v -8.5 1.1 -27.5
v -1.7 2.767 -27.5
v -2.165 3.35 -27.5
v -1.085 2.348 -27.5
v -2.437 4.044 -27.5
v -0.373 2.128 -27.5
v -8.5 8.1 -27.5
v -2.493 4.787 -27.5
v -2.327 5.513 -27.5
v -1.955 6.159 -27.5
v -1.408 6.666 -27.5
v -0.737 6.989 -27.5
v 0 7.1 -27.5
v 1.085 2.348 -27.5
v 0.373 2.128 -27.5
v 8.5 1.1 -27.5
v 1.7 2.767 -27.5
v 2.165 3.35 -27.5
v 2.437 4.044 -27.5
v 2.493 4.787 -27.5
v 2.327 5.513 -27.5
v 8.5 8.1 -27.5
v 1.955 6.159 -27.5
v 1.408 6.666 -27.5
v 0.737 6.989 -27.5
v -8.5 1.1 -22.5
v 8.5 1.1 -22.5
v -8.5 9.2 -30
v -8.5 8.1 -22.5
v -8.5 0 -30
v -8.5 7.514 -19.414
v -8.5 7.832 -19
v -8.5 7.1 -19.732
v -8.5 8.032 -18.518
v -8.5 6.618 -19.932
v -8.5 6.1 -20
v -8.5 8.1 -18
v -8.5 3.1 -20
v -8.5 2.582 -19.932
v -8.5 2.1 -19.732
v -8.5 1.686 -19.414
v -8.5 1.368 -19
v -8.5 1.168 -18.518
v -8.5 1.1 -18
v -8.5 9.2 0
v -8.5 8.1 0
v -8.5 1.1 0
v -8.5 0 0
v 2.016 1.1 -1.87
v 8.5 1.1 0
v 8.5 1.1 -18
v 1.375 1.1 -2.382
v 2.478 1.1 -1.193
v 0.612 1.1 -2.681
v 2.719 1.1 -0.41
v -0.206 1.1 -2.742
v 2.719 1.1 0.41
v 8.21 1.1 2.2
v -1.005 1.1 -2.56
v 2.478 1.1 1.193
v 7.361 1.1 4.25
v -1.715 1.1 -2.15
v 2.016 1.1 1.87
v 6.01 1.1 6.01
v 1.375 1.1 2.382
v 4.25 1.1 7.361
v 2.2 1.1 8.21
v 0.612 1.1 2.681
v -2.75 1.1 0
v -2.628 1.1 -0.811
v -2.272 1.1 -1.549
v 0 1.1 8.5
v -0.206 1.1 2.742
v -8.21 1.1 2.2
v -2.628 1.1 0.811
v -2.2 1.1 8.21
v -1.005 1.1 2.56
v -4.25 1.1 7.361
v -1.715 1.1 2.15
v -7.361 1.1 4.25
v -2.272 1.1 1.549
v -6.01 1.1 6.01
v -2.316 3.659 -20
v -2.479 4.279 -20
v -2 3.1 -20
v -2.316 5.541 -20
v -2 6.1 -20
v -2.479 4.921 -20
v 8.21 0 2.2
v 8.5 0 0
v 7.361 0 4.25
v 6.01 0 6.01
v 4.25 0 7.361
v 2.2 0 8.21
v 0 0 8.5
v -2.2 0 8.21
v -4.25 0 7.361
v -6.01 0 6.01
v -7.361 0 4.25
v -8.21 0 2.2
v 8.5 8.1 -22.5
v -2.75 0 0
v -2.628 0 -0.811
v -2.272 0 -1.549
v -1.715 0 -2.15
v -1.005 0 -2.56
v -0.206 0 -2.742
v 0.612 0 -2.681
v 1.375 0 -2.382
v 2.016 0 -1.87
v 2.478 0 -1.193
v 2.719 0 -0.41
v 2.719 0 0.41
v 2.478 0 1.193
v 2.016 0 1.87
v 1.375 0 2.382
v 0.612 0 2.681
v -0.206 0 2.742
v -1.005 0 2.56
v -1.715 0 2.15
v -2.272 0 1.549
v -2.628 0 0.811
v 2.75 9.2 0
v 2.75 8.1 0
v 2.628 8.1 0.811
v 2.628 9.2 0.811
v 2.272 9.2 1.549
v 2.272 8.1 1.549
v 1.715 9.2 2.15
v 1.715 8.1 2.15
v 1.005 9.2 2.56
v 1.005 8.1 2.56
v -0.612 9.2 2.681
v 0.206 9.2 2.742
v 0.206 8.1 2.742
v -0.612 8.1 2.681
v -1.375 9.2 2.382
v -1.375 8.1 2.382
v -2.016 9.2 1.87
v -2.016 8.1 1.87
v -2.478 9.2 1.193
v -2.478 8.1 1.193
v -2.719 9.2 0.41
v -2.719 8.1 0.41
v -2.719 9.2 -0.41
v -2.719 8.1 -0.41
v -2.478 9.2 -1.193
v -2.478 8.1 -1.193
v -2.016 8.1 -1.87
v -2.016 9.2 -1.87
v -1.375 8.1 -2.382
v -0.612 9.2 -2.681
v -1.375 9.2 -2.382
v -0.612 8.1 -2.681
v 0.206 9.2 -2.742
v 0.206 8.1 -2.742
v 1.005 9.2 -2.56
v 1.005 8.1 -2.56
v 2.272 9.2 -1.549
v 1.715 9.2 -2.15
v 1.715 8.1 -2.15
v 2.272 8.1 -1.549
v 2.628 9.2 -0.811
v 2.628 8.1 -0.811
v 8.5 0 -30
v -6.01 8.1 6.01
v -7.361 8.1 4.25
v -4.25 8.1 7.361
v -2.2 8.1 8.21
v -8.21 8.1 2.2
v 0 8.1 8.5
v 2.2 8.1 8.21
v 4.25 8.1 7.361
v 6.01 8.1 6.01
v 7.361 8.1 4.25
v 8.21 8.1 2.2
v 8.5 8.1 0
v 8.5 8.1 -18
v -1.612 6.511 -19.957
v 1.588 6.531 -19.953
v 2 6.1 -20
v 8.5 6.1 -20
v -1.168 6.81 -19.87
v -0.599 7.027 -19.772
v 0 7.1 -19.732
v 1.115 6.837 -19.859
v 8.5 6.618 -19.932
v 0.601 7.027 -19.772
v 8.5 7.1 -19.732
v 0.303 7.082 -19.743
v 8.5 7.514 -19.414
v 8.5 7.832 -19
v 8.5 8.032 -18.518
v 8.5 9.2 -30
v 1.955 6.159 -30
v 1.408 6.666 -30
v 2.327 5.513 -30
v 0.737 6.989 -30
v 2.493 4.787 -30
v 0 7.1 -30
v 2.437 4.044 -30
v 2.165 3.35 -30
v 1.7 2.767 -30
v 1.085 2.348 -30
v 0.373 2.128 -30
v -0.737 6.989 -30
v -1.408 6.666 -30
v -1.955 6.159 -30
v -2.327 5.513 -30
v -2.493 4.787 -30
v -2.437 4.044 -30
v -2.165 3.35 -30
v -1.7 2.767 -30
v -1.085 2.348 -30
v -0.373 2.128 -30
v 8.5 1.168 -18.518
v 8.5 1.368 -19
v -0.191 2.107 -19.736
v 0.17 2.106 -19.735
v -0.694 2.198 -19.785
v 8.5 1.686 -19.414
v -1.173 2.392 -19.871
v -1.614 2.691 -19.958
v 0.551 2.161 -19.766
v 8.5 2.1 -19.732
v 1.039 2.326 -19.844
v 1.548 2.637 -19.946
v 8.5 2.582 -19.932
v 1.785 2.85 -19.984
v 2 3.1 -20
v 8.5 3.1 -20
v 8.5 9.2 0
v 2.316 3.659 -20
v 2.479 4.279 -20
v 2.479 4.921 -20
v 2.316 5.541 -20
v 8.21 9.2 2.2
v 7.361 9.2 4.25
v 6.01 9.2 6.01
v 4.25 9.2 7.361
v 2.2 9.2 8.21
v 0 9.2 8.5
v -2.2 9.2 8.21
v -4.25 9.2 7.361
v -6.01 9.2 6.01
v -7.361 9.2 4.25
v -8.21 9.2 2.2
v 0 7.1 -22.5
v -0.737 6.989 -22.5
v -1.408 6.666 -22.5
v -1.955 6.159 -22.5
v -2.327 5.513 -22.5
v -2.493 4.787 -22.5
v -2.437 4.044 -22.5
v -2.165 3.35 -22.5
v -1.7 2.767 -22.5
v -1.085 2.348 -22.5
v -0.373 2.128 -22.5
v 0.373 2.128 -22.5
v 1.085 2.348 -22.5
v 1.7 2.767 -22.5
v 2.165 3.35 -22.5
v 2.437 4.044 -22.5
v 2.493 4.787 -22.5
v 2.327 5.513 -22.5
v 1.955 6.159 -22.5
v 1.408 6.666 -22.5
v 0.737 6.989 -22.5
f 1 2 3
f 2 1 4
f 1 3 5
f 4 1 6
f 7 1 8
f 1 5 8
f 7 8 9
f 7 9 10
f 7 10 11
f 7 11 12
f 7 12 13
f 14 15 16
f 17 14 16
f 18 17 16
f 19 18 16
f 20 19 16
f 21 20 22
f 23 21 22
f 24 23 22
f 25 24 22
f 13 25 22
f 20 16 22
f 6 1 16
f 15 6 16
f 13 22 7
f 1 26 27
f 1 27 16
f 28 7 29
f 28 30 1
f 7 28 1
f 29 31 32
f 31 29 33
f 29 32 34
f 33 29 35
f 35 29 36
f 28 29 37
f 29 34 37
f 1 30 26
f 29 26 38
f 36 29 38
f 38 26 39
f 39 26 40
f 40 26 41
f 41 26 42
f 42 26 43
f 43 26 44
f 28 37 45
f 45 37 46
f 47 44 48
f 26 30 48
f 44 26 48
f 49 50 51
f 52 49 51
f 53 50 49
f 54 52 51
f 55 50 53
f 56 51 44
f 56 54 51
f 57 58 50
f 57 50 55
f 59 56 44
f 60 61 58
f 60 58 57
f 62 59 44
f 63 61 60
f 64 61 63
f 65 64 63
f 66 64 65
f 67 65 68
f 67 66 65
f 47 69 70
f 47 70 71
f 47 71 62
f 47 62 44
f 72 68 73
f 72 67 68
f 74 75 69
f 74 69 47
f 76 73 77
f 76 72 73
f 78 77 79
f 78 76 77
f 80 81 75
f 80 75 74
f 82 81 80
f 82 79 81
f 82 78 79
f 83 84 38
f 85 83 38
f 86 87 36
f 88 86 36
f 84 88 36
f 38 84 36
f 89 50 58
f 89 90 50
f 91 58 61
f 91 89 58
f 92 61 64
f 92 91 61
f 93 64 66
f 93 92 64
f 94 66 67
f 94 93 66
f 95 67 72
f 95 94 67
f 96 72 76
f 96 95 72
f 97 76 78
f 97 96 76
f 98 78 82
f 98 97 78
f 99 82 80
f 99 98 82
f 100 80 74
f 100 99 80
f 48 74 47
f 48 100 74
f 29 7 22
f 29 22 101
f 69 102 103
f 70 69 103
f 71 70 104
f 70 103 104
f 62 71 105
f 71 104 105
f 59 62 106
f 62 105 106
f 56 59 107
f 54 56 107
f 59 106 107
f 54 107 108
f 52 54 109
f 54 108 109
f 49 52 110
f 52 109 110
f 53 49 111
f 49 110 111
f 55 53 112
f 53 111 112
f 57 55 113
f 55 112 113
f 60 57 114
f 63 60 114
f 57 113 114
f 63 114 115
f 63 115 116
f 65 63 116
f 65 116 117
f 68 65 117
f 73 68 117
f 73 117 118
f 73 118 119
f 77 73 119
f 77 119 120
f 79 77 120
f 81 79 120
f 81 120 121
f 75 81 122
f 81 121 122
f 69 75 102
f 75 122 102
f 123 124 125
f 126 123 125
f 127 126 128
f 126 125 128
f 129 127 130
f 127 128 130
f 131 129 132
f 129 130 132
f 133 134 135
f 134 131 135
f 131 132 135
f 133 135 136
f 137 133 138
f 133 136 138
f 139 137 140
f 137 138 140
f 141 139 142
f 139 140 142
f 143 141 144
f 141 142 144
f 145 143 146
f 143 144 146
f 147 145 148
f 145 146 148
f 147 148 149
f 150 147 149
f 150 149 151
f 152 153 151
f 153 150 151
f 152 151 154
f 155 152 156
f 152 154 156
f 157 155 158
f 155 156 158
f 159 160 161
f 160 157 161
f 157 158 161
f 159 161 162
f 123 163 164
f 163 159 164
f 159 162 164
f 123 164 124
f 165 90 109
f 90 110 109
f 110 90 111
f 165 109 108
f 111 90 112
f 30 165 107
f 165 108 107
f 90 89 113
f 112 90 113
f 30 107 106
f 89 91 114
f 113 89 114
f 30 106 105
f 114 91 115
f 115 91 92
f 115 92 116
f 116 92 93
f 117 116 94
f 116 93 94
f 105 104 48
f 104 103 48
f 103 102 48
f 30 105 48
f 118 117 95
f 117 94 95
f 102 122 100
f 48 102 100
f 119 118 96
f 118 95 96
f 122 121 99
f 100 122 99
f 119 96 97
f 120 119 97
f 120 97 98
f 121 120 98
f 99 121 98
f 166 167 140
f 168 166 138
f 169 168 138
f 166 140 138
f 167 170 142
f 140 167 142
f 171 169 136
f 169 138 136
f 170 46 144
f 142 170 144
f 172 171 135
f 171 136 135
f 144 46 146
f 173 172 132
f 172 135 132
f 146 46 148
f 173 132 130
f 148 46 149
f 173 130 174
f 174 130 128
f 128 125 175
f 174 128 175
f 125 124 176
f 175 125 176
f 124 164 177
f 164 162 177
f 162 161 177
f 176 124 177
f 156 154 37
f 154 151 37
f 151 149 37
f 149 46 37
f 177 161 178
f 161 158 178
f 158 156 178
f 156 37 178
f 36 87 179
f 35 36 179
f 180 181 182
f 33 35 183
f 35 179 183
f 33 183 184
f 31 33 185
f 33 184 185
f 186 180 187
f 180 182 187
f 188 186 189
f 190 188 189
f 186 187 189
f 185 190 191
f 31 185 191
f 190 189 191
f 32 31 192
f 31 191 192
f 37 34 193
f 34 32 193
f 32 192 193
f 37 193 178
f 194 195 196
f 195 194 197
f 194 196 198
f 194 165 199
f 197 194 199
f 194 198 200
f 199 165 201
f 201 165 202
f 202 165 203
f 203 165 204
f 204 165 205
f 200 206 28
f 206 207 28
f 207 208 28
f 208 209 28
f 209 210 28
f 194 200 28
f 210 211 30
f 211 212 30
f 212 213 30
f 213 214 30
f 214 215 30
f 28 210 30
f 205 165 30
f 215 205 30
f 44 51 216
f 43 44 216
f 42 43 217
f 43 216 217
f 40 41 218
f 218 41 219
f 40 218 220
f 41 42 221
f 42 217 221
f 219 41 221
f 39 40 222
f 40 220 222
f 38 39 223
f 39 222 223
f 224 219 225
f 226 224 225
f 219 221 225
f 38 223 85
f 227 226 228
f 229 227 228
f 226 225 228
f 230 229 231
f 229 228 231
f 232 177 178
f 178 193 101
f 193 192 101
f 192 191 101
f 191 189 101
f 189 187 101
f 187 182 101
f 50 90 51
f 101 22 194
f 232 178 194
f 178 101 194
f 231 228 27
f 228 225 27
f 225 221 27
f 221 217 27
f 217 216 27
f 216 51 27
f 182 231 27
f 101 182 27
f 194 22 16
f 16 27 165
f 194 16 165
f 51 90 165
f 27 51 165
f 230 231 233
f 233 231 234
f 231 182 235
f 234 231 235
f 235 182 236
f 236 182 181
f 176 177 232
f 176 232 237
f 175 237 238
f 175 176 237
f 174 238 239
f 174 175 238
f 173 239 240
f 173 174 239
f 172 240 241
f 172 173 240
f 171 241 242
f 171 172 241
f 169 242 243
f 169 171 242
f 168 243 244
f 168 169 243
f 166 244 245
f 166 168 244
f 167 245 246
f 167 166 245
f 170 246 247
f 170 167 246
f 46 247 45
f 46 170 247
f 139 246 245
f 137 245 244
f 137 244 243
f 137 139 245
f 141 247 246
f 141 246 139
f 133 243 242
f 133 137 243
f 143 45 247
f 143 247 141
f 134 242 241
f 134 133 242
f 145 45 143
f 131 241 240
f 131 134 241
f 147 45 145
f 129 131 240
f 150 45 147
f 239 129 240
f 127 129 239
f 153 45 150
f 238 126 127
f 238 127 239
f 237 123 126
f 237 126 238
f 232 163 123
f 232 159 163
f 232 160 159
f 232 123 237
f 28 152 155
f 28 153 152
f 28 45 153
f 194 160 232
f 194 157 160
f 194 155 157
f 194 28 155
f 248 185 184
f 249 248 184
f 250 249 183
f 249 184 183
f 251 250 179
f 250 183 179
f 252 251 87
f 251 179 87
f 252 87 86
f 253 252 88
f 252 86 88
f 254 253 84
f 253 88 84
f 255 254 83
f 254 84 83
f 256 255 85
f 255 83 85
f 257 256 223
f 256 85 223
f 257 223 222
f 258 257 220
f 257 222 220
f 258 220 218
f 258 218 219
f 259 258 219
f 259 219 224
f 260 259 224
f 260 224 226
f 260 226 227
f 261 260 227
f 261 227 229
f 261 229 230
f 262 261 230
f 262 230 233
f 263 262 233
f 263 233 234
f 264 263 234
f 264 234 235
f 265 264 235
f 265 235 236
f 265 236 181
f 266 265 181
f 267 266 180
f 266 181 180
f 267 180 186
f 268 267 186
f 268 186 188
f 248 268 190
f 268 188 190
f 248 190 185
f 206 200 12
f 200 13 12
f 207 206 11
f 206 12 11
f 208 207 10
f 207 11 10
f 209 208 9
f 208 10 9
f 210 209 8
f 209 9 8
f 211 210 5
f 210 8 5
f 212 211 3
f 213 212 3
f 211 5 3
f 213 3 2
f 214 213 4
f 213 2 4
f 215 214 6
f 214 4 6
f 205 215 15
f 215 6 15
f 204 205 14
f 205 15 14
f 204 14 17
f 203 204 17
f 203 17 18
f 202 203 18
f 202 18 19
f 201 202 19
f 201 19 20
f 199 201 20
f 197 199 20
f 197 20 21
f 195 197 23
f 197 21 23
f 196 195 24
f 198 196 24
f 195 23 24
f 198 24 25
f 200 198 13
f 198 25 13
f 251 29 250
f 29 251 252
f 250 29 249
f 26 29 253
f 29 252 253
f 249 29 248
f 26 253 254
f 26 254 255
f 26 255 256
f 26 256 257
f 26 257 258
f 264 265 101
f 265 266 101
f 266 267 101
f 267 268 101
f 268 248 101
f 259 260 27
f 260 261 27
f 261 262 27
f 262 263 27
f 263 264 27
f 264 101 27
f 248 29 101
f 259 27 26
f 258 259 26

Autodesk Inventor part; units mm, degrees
ref_plane "YZ Plane" through (0, 0, 0) normal (1, 0, 0) x (0, 1, 0)
sketch "Esquisse1" plane through (0, 0, 0) normal (0, 1, 0) x (-1, 0, 0)
  circle A0 centre (0, 0) radius 8.5
  circle A1 centre (0, 0) radius 2.75
  line L0 (0, 0) -> (0, -30)
  line L1 (8.5, -30) -> (8.5, 0)
  line L2 (-8.5, -30) -> (-8.5, 0)
  line L3 (8.5, -30) -> (-8.5, -30)
  dimension "d0" = 17
  dimension "d1" = 5.5
  dimension "d4" = 30
  dimension "d5" = 30
  dimension "d6" = 30
extrude "Extrusion1" add sketch "Esquisse1" along normal blind 1.1
ref_plane "Plan de construction1" through (0, 8.1, 0) normal (0, 1, 0) x (1, 0, 0)
sketch "Esquisse3" plane through (0, 8.1, 0) normal (0, 1, 0) x (1, 0, 0)
  arc A0 (-8.5, 0) -> (8.5, 0) centre (0, 0) ccw projected
  line L0 (-8.5, 20) -> (-8.5, 0) projected
  line L1 (8.5, 0) -> (8.5, 20) projected
  line L2 (-8.5, 30) -> (-8.5, 15) projected
  line L3 (8.5, 30) -> (-8.5, 30) projected
  line L4 (8.5, 15) -> (8.5, 30) projected
  circle A1 centre (0, 0) radius 2.75 projected
extrude "Extrusion3" add sketch "Esquisse3" along normal blind 1.1
ref_plane "Plan de construction2" through (0, 4.6, 0) normal (0, -1, 0) x (1, 0, 0)
sketch "Esquisse7" plane through (0, 4.6, 0) normal (0, -1, 0) x (1, 0, 0)
  line L0 (8.5, -30) -> (-8.5, -30) projected
  line L1 (-8.5, -30) -> (8.5, -30)
  line L2 (8.5, -30) -> (8.5, -20)
  line L3 (8.5, -20) -> (-8.5, -20)
  line L4 (-8.5, -20) -> (-8.5, -30)
  point P0 (0, 0)
  dimension "d41" = 10
extrude "Extrusion5" add sketch "Esquisse7" along normal mid plane 7
sketch "Esquisse8" plane through (8.5, 0, 0) normal (1, 0, 0) x (0, 0, -1)
  line L0 (20, 8.1) -> (0, 8.1) projected
  line L1 (30, 0) -> (30, 9.2) projected
  line L2 (0, 0) -> (30, 0) projected
  line L3 (25, 8.1) -> (27.5, 8.1)
  line L4 (27.5, 8.1) -> (22.5, 8.1)
  line L5 (22.5, 8.1) -> (22.5, 1.1)
  line L6 (22.5, 1.1) -> (27.5, 1.1)
  line L7 (27.5, 1.1) -> (27.5, 8.1)
  line L8 (0, 9.2) -> (30, 9.2) projected
  dimension "d43" = 5
  dimension "d44" = 7
  dimension "d45" = 1.1
  dimension "d46" = 2.5
extrude "Extrusion6" cut sketch "Esquisse8" against normal through all
sketch "Esquisse9" plane through (8.5, 0, -30) normal (0, 0, -1) x (-1, 0, 0)
  line L0 (5.75, 9.2) -> (11.25, 9.2) projected
  line L1 (8.5, 9.2) -> (8.5, 0)
  point P0 (8.5, 4.6)
hole "Perçage3" at (0, 4.6, -30) direction (0, 0, 1) diameter 5 end through all
fillet "Congé3" radius 2 2 edges at (0, 8.1, -20) (0, 1.1, -20)
properties part number "bielle sup"
